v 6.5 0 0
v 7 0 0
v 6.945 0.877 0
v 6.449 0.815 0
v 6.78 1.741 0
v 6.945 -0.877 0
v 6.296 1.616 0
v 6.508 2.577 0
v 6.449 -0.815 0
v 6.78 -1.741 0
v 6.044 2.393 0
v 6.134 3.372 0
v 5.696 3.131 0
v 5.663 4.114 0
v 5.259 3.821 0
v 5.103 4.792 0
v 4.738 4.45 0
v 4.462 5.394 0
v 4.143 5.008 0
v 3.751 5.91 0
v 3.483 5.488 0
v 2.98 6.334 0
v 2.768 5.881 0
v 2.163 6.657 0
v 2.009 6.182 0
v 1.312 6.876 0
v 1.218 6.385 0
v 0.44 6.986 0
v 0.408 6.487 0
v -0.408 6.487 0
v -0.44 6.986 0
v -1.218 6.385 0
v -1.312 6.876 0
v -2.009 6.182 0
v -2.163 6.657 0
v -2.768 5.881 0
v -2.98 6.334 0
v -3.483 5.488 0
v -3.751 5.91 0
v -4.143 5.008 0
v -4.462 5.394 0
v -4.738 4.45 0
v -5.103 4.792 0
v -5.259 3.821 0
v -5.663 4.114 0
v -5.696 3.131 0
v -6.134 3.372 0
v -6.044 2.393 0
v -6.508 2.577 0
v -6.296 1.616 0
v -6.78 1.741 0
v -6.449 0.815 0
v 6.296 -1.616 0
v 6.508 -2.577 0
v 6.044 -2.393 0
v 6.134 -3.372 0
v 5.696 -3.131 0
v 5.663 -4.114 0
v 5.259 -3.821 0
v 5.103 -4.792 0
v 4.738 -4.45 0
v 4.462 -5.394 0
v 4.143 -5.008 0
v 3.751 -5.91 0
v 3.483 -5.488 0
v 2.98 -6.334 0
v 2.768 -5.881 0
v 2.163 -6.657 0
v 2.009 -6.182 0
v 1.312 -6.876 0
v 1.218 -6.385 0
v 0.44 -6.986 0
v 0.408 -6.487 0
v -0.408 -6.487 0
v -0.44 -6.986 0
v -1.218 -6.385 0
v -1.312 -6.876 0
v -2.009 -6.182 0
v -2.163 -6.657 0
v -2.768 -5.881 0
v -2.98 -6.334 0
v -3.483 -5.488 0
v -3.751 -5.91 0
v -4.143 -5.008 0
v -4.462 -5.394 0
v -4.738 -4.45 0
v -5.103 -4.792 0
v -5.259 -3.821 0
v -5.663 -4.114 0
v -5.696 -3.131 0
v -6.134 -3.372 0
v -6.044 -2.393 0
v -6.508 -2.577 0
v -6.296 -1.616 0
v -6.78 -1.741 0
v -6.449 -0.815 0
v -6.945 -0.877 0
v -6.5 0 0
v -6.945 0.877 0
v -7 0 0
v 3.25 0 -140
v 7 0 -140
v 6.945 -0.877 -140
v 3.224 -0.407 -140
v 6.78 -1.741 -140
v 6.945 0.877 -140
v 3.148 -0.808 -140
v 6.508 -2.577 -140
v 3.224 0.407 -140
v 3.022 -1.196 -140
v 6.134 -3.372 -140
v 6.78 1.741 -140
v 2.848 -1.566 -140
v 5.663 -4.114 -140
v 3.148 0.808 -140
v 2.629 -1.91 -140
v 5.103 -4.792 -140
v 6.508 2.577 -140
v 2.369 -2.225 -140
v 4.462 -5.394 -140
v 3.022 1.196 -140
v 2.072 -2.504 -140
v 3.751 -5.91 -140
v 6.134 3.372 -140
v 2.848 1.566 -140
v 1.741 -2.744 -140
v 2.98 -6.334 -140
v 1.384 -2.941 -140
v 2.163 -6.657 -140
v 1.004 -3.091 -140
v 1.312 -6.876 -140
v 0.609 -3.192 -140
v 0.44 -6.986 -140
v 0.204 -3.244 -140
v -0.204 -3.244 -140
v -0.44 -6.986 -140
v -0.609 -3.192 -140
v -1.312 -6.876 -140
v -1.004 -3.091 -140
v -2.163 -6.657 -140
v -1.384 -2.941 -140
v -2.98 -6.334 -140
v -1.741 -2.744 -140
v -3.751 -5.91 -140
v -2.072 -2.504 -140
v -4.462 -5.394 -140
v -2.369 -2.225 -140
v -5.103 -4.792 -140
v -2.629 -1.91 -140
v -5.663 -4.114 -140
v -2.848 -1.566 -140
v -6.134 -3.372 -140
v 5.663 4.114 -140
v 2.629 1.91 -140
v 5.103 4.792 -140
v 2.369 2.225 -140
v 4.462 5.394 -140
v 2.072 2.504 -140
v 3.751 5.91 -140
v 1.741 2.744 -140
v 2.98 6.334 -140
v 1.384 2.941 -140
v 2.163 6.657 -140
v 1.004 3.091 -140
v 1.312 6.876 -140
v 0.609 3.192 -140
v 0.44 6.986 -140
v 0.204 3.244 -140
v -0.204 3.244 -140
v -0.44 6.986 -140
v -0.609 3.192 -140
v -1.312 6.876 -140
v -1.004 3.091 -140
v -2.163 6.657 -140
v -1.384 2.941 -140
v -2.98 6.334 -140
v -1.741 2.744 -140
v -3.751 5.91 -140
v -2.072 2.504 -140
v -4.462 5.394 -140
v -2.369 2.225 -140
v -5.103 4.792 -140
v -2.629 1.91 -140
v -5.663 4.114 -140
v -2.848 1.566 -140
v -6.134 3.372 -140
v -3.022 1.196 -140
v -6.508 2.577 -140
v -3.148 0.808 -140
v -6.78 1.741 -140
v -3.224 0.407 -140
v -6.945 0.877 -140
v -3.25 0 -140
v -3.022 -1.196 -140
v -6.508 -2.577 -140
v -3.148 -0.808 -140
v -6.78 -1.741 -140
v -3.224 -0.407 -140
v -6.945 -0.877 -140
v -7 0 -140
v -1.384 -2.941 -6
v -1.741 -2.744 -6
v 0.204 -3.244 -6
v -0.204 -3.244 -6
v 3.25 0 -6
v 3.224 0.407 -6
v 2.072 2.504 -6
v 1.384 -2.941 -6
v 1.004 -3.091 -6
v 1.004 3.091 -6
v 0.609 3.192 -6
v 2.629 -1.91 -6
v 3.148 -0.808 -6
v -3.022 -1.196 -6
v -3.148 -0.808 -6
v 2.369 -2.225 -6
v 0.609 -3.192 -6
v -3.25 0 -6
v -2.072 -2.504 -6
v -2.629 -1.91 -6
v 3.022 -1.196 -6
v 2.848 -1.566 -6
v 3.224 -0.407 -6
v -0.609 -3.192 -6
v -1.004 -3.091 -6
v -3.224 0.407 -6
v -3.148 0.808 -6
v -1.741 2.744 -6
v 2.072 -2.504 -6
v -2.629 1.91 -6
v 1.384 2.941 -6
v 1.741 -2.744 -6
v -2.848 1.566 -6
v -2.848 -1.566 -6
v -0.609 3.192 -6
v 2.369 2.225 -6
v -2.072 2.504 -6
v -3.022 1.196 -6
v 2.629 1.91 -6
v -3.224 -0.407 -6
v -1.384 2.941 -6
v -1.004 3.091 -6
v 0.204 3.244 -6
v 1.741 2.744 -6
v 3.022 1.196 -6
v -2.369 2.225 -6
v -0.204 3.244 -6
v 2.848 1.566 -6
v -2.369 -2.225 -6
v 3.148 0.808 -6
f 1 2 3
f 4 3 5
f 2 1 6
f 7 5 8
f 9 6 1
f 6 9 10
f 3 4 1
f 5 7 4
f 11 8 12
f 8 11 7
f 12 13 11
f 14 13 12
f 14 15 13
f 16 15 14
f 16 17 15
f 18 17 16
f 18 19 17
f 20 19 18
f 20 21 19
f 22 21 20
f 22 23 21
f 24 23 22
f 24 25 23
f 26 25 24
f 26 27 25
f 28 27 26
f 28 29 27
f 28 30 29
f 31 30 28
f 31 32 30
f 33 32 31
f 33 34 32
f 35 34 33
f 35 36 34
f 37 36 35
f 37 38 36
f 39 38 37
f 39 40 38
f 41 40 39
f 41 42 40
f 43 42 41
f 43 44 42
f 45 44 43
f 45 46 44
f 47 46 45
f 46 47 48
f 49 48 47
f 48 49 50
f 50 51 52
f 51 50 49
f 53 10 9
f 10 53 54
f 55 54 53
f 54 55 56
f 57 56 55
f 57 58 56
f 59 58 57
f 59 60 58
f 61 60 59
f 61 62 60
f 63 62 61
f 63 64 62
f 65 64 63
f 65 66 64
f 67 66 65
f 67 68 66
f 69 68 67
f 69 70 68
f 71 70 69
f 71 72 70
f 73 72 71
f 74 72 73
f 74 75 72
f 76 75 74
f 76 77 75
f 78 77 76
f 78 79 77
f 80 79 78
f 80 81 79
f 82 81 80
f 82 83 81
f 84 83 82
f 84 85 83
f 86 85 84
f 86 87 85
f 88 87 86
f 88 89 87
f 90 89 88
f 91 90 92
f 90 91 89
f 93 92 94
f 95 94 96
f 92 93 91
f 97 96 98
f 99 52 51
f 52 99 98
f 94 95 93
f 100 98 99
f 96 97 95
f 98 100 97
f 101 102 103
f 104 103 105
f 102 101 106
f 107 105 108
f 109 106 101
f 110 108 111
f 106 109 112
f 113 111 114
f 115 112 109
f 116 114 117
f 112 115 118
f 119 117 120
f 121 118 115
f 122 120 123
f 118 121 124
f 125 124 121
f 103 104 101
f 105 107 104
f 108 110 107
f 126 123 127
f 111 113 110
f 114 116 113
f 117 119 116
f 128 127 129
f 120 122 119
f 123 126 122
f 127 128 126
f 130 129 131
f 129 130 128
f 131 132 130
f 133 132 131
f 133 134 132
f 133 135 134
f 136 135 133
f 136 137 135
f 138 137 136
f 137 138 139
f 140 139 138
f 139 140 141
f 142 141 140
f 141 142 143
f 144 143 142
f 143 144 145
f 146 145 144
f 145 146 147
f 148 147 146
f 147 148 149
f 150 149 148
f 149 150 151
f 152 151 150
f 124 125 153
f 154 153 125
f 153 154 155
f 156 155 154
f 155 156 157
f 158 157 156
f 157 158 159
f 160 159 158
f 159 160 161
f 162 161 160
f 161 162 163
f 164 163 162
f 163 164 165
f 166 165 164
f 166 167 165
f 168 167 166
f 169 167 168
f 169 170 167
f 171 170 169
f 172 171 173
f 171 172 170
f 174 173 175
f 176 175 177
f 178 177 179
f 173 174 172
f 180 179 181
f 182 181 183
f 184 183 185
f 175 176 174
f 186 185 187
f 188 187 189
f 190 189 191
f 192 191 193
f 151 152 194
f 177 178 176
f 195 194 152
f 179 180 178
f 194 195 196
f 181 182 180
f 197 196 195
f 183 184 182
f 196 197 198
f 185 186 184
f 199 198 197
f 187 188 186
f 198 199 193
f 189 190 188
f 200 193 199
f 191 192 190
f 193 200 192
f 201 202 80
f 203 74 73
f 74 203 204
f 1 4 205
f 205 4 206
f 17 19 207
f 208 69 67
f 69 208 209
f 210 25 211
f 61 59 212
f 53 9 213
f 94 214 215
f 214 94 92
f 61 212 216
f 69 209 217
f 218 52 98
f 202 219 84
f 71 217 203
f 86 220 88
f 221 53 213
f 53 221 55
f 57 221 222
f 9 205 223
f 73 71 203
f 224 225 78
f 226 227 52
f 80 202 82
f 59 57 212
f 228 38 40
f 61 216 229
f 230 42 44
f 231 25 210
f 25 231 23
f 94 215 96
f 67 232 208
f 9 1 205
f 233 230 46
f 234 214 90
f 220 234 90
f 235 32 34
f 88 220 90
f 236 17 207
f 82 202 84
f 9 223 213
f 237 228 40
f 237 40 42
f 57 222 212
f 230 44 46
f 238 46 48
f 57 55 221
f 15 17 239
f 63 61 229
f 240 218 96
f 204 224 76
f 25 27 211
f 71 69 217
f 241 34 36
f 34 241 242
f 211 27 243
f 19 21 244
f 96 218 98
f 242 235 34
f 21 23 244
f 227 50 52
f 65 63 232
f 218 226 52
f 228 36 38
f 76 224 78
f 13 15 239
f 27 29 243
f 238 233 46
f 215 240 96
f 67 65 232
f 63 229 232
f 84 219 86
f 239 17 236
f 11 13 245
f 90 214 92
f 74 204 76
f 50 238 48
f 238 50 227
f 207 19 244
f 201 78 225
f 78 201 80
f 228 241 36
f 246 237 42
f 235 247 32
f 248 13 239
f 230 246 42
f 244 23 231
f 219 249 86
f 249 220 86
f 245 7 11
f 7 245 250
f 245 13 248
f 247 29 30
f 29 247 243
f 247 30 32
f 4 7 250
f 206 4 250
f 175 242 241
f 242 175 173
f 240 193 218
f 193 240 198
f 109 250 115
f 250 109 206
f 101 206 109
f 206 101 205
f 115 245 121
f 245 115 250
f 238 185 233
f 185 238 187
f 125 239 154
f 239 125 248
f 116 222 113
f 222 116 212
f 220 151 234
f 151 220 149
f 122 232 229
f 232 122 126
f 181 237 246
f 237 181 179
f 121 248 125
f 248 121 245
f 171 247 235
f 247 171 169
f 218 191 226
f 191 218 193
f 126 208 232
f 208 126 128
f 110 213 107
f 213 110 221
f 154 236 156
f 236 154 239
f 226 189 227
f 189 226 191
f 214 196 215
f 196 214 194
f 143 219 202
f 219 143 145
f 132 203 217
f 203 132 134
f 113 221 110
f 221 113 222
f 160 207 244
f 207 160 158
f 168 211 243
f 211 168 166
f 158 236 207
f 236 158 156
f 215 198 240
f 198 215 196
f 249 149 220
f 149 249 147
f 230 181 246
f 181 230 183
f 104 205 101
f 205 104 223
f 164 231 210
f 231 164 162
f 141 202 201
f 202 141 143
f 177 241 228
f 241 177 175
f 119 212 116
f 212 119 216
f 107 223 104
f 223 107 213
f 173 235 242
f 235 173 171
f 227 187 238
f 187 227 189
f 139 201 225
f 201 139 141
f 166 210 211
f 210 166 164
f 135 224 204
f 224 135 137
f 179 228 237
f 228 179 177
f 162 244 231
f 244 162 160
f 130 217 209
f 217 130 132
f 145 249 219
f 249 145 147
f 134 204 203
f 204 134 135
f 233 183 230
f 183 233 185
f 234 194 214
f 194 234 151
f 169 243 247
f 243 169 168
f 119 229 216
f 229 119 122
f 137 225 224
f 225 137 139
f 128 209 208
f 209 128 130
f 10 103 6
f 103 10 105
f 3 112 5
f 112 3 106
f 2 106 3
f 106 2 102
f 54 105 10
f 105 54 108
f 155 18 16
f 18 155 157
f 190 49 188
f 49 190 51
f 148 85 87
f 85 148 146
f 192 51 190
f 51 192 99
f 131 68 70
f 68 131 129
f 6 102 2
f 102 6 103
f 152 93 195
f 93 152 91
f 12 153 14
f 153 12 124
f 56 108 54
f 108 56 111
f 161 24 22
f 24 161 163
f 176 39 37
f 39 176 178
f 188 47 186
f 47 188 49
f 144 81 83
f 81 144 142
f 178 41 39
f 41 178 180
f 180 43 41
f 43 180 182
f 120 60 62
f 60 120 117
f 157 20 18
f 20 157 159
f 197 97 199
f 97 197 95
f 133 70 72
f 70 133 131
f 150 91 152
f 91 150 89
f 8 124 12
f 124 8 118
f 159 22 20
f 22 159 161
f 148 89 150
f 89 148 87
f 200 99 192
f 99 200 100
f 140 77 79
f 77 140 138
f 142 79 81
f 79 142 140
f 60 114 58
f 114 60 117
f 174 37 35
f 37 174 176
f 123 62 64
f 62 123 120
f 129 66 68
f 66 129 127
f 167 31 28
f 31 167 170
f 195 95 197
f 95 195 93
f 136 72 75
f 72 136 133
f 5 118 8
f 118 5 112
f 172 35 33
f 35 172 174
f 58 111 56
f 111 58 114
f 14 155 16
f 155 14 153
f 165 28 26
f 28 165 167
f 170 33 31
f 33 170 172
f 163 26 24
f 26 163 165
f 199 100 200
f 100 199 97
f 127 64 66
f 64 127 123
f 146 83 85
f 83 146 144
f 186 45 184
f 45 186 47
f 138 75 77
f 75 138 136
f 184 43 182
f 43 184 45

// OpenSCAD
$fn = 50;


difference() {
	union() {
		translate(v = [0, 0, -140.0000000000]) {
			cylinder(h = 140, r = 7.0000000000);
		}
		cylinder(h = 0, r = 10.0000000000);
	}
	union() {
		translate(v = [0, 0, 0]) {
			rotate(a = [0, 0, 0]) {
				difference() {
					union() {
						#translate(v = [0, 0, -140.0000000000]) {
							cylinder(h = 140, r = 2.2500000000);
						}
						#translate(v = [0, 0, -6]) {
							cylinder(h = 6, r = 7.0000000000, r1 = 3.2500000000, r2 = 6.5000000000);
						}
						#translate(v = [0, 0, -140.0000000000]) {
							cylinder(h = 140, r = 3.2500000000);
						}
						#translate(v = [0, 0, -140.0000000000]) {
							cylinder(h = 140, r = 2.2500000000);
						}
					}
					union();
				}
			}
		}
	}
}
